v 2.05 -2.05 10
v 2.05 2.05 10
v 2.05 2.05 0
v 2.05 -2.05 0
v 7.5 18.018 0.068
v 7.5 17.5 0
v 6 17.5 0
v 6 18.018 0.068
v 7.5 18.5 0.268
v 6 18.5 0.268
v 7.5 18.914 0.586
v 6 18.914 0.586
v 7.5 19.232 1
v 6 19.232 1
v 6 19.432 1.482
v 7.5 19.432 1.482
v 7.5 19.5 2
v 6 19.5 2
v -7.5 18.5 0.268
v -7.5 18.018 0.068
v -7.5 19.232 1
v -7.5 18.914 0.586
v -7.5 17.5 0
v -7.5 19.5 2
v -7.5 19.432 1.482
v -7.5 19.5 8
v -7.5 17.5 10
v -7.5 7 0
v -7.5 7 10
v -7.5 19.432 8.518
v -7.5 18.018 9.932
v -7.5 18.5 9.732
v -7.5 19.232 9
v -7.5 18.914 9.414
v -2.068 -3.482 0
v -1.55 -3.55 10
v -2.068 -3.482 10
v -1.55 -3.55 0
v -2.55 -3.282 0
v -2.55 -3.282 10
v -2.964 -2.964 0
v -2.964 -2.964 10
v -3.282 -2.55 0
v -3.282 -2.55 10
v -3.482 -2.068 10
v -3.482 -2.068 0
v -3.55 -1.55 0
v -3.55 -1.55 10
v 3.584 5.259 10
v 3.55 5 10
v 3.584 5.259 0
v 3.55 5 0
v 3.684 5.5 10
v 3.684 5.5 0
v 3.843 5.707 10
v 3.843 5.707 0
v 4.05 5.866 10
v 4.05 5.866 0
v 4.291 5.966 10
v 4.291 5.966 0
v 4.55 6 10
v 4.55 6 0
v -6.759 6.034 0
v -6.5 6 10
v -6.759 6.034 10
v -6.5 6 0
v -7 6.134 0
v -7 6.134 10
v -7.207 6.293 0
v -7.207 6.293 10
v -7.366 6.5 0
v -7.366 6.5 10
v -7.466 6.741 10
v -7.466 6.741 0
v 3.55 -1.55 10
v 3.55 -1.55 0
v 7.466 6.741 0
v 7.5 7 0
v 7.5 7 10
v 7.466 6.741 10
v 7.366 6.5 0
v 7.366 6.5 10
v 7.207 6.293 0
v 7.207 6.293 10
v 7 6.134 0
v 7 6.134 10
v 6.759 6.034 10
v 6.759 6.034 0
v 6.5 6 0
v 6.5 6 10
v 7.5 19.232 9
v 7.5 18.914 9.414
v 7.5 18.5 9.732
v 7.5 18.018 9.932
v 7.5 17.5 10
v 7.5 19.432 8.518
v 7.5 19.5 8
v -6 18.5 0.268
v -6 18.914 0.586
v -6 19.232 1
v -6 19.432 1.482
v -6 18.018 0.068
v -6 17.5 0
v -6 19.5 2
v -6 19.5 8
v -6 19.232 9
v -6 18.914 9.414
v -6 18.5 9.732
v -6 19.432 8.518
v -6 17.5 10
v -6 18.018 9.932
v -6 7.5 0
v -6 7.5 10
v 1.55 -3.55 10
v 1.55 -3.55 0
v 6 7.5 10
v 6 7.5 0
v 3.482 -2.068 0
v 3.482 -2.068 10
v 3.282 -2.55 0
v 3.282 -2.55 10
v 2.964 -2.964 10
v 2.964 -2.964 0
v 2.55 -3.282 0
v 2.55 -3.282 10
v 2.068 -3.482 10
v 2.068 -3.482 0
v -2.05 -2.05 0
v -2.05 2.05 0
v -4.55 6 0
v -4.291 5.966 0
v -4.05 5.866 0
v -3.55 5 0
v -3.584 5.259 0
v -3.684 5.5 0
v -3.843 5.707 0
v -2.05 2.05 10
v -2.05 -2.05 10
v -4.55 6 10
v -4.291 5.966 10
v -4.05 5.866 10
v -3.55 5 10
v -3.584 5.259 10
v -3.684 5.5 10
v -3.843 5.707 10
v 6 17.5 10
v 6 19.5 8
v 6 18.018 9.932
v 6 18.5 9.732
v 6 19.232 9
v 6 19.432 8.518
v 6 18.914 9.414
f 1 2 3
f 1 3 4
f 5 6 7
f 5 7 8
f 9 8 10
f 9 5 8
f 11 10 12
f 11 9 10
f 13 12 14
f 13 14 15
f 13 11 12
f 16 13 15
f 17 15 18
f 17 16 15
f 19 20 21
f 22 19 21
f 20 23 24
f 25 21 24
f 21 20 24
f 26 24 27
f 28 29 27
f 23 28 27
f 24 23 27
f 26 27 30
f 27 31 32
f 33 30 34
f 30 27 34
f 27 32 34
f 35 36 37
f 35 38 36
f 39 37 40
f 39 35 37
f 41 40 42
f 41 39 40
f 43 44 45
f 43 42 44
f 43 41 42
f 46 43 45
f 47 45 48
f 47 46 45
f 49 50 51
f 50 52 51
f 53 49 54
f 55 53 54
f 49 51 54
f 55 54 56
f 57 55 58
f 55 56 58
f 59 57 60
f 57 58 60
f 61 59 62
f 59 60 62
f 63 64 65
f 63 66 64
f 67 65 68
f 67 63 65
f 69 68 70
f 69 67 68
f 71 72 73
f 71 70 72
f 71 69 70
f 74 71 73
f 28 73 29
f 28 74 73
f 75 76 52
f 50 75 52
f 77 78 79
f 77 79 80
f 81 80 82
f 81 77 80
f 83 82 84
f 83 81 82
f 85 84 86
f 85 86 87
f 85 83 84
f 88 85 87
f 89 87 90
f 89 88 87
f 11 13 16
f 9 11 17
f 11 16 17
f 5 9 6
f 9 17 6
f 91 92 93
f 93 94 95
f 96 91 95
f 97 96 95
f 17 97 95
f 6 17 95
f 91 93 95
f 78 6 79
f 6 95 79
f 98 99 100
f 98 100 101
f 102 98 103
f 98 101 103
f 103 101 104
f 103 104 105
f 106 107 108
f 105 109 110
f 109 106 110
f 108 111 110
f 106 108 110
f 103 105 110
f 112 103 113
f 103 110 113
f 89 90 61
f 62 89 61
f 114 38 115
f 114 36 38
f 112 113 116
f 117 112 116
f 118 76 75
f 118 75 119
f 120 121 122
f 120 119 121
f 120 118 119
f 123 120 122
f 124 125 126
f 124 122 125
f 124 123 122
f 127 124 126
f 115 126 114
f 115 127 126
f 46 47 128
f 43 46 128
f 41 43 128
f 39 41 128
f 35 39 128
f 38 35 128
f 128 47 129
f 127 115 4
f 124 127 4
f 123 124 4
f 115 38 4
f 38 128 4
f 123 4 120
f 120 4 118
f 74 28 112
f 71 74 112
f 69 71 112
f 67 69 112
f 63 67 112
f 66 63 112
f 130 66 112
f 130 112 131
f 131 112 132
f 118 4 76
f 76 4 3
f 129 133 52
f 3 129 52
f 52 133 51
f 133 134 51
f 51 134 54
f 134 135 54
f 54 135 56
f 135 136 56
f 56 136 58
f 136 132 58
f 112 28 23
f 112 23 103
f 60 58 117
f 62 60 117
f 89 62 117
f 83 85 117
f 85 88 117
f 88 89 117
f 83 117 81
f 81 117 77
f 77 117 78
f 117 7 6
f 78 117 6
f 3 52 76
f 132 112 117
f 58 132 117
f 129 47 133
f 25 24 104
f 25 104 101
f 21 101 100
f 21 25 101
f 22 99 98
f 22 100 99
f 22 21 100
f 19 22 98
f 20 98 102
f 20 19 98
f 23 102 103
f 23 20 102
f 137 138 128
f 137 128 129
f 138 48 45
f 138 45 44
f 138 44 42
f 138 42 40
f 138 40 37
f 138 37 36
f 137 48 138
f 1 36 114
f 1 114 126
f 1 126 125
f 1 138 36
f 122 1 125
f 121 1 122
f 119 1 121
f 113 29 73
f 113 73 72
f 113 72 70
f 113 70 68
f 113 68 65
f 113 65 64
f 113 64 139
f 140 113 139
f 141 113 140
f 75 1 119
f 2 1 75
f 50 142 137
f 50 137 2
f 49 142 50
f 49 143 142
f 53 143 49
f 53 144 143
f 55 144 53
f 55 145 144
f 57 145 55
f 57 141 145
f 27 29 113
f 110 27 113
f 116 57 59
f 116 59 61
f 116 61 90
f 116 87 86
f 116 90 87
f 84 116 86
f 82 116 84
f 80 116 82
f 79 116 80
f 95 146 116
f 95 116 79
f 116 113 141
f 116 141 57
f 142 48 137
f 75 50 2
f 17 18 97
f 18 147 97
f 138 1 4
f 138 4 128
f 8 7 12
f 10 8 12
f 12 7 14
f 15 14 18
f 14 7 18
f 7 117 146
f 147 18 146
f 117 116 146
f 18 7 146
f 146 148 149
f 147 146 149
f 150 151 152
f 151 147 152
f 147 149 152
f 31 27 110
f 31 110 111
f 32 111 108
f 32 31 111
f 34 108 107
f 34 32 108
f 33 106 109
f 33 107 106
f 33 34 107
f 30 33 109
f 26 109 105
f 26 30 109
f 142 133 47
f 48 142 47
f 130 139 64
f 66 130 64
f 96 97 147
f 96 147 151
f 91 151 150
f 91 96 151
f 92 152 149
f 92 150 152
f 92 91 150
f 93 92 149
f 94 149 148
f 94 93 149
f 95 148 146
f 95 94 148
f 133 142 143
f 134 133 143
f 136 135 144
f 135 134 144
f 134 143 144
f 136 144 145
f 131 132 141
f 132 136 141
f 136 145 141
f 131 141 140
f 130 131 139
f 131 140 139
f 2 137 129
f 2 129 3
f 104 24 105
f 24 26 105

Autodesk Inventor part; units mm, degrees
ref_plane "YZ Plane" through (0, 0, 0) normal (1, 0, 0) x (0, 1, 0)
ref_plane "XZ Plane" through (0, 0, 0) normal (0, 1, 0) x (-1, 0, 0)
ref_plane "XY Plane" through (0, 0, 0) normal (0, 0, 1) x (1, 0, 0)
sketch "Sketch1" plane through (0, 0, 0) normal (0, 0, 1) x (1, 0, 0)
  line L0 (-2.05, 2.05) -> (2.05, 2.05)
  line L1 (2.05, 2.05) -> (2.05, -2.05)
  line L2 (2.05, -2.05) -> (-2.05, -2.05)
  line L3 (-2.05, -2.05) -> (-2.05, 2.05)
  line L4 (0, 2.05) -> (0, -2.05) construction
  line L5 (0, 7.5) -> (-15.55, 7.5)
  line L6 (-15.55, 7.5) -> (-15.55, 6)
  line L7 (-15.55, 6) -> (-3.55, 6)
  line L8 (-3.55, 6) -> (-3.55, -6)
  line L9 (-3.55, -6) -> (-15.55, -6)
  line L10 (-15.55, -6) -> (-15.55, -7.5)
  line L11 (-15.55, -7.5) -> (-0.55, -7.5)
  line L12 (-2.05, 0) -> (2.05, 0) construction
  line L13 (0, 7.5) -> (15.55, 7.5)
  line L14 (15.55, 7.5) -> (15.55, 6)
  line L15 (15.55, 6) -> (3.55, 6)
  line L16 (3.55, 6) -> (3.55, -6)
  line L17 (3.55, -6) -> (15.55, -6)
  line L18 (15.55, -6) -> (15.55, -7.5)
  line L19 (15.55, -7.5) -> (-0.55, -7.5)
  line L20 (-2.05, 2.05) -> (2.05, -2.05) construction
  line L21 (2.05, 2.05) -> (-2.05, -2.05) construction
  line L22 (0, 7.5) -> (0, 2.05) construction
  line L23 (-3.55, 6) -> (-3.55, 7.5)
  line L24 (-3.55, -6) -> (-3.55, -7.5)
  line L25 (3.55, 6) -> (3.55, 7.5)
  line L26 (3.55, -6) -> (3.55, -7.5)
  point P0 (0, 0)
  point P1 (0, 0)
  point P2 (0, 0)
  dimension "d3" = 4.1
  dimension "d4" = 4.1
  dimension "d5" = 12
  dimension "d6" = 1.5
  dimension "d7" = 1.5
  dimension "d8" = 5.45
  dimension "d9" = 5.45
  dimension "d10" = 1.5
  dimension "d11" = 12
  dimension "d37" = 15
extrude "Extrusion1" add sketch "Sketch1" along normal blind 10 contours L13 L25 L16 L26 L19 L11 L24 L8 L23 L5
sketch "Sketch5" plane through (0, 0, 10) normal (0, 0, 1) x (1, 0, 0)
  line L0 (6, 19.5) -> (7.5, 19.5)
  line L1 (7.5, 19.5) -> (7.5, 7.5)
  line L2 (7.5, 7.5) -> (6, 7.5)
  line L3 (6, 7.5) -> (6, 19.5)
  line L4 (3.55, 7.5) -> (-3.55, 7.5) projected
  line L5 (3.55, -7.5) -> (3.55, 7.5) projected
  line L6 (0, 0) -> (0, 23.4065) construction
  point P0 (15.55, 7.5)
  point P1 (-15.55, 7.5)
  point P2 (3.55, -6)
  point P3 (3.55, 6)
  dimension "d41" = 1.5
  dimension "d42" = 12
  dimension "d47" = 6
extrude "Extrusion5" add sketch "Sketch5" against normal up to surface (10 mm away)
mirror "Mirror1" about plane through (0, 0, 0) normal (1, 0, 0) of "Extrusion5"
sketch "Sketch7" plane through (0, 0, 10) normal (0, 0, 1) x (1, 0, 0)
  line L0 (-7.5, 19.5) -> (-7.5, 7.5) projected
  line L1 (-7.5, 7.5) -> (7.5, 7.5)
  line L2 (7.5, 7.5) -> (7.5, 6)
  line L3 (7.5, 6) -> (-7.5, 6)
  line L4 (-7.5, 6) -> (-7.5, 7.5)
  line L5 (7.5, 7.5) -> (7.5, 19.5) projected
  point P0 (0, 0)
  dimension "d53" = 1.5
extrude "Extrusion7" add sketch "Sketch7" against normal up to surface (10 mm away)
fillet "Fillet3" radius 1 4 edges at (-3.55, 6, 5) (3.55, 6, 5) (7.5, 6, 5) (-7.5, 6, 5)
sketch "Sketch8" plane through (0, 0, 10) normal (0, 0, 1) x (1, 0, 0)
  line L0 (-3.55, -3.55) -> (3.55, -3.55)
  line L1 (3.55, -3.55) -> (3.55, -7.5)
  line L2 (3.55, -7.5) -> (-3.55, -7.5)
  line L3 (-3.55, -7.5) -> (-3.55, -3.55)
  line L4 (2.05, -2.05) -> (-2.05, -2.05) projected
  line L5 (3.55, -7.5) -> (3.55, 5) projected
  line L6 (-3.55, 5) -> (-3.55, -7.5) projected
  line L7 (-3.55, -7.5) -> (3.55, -7.5) projected
  point P0 (0, 0)
  dimension "d57" = 1.5
extrude "Extrusion8" cut sketch "Sketch8" against normal blind 10
fillet "Fillet4" radius 2 4 edges at (-6.75, 19.5, 10) (-6.75, 19.5, 0) (6.75, 19.5, 0) (6.75, 19.5, 10)
fillet "Fillet5" radius 2 2 edges at (3.55, -3.55, 5) (-3.55, -3.55, 5)
equation "\"d7\" = d6"
equation "\"d8\" = d9"
properties part number "fuselage_tail_interface_airfoiled" material "ABS Plastic"
